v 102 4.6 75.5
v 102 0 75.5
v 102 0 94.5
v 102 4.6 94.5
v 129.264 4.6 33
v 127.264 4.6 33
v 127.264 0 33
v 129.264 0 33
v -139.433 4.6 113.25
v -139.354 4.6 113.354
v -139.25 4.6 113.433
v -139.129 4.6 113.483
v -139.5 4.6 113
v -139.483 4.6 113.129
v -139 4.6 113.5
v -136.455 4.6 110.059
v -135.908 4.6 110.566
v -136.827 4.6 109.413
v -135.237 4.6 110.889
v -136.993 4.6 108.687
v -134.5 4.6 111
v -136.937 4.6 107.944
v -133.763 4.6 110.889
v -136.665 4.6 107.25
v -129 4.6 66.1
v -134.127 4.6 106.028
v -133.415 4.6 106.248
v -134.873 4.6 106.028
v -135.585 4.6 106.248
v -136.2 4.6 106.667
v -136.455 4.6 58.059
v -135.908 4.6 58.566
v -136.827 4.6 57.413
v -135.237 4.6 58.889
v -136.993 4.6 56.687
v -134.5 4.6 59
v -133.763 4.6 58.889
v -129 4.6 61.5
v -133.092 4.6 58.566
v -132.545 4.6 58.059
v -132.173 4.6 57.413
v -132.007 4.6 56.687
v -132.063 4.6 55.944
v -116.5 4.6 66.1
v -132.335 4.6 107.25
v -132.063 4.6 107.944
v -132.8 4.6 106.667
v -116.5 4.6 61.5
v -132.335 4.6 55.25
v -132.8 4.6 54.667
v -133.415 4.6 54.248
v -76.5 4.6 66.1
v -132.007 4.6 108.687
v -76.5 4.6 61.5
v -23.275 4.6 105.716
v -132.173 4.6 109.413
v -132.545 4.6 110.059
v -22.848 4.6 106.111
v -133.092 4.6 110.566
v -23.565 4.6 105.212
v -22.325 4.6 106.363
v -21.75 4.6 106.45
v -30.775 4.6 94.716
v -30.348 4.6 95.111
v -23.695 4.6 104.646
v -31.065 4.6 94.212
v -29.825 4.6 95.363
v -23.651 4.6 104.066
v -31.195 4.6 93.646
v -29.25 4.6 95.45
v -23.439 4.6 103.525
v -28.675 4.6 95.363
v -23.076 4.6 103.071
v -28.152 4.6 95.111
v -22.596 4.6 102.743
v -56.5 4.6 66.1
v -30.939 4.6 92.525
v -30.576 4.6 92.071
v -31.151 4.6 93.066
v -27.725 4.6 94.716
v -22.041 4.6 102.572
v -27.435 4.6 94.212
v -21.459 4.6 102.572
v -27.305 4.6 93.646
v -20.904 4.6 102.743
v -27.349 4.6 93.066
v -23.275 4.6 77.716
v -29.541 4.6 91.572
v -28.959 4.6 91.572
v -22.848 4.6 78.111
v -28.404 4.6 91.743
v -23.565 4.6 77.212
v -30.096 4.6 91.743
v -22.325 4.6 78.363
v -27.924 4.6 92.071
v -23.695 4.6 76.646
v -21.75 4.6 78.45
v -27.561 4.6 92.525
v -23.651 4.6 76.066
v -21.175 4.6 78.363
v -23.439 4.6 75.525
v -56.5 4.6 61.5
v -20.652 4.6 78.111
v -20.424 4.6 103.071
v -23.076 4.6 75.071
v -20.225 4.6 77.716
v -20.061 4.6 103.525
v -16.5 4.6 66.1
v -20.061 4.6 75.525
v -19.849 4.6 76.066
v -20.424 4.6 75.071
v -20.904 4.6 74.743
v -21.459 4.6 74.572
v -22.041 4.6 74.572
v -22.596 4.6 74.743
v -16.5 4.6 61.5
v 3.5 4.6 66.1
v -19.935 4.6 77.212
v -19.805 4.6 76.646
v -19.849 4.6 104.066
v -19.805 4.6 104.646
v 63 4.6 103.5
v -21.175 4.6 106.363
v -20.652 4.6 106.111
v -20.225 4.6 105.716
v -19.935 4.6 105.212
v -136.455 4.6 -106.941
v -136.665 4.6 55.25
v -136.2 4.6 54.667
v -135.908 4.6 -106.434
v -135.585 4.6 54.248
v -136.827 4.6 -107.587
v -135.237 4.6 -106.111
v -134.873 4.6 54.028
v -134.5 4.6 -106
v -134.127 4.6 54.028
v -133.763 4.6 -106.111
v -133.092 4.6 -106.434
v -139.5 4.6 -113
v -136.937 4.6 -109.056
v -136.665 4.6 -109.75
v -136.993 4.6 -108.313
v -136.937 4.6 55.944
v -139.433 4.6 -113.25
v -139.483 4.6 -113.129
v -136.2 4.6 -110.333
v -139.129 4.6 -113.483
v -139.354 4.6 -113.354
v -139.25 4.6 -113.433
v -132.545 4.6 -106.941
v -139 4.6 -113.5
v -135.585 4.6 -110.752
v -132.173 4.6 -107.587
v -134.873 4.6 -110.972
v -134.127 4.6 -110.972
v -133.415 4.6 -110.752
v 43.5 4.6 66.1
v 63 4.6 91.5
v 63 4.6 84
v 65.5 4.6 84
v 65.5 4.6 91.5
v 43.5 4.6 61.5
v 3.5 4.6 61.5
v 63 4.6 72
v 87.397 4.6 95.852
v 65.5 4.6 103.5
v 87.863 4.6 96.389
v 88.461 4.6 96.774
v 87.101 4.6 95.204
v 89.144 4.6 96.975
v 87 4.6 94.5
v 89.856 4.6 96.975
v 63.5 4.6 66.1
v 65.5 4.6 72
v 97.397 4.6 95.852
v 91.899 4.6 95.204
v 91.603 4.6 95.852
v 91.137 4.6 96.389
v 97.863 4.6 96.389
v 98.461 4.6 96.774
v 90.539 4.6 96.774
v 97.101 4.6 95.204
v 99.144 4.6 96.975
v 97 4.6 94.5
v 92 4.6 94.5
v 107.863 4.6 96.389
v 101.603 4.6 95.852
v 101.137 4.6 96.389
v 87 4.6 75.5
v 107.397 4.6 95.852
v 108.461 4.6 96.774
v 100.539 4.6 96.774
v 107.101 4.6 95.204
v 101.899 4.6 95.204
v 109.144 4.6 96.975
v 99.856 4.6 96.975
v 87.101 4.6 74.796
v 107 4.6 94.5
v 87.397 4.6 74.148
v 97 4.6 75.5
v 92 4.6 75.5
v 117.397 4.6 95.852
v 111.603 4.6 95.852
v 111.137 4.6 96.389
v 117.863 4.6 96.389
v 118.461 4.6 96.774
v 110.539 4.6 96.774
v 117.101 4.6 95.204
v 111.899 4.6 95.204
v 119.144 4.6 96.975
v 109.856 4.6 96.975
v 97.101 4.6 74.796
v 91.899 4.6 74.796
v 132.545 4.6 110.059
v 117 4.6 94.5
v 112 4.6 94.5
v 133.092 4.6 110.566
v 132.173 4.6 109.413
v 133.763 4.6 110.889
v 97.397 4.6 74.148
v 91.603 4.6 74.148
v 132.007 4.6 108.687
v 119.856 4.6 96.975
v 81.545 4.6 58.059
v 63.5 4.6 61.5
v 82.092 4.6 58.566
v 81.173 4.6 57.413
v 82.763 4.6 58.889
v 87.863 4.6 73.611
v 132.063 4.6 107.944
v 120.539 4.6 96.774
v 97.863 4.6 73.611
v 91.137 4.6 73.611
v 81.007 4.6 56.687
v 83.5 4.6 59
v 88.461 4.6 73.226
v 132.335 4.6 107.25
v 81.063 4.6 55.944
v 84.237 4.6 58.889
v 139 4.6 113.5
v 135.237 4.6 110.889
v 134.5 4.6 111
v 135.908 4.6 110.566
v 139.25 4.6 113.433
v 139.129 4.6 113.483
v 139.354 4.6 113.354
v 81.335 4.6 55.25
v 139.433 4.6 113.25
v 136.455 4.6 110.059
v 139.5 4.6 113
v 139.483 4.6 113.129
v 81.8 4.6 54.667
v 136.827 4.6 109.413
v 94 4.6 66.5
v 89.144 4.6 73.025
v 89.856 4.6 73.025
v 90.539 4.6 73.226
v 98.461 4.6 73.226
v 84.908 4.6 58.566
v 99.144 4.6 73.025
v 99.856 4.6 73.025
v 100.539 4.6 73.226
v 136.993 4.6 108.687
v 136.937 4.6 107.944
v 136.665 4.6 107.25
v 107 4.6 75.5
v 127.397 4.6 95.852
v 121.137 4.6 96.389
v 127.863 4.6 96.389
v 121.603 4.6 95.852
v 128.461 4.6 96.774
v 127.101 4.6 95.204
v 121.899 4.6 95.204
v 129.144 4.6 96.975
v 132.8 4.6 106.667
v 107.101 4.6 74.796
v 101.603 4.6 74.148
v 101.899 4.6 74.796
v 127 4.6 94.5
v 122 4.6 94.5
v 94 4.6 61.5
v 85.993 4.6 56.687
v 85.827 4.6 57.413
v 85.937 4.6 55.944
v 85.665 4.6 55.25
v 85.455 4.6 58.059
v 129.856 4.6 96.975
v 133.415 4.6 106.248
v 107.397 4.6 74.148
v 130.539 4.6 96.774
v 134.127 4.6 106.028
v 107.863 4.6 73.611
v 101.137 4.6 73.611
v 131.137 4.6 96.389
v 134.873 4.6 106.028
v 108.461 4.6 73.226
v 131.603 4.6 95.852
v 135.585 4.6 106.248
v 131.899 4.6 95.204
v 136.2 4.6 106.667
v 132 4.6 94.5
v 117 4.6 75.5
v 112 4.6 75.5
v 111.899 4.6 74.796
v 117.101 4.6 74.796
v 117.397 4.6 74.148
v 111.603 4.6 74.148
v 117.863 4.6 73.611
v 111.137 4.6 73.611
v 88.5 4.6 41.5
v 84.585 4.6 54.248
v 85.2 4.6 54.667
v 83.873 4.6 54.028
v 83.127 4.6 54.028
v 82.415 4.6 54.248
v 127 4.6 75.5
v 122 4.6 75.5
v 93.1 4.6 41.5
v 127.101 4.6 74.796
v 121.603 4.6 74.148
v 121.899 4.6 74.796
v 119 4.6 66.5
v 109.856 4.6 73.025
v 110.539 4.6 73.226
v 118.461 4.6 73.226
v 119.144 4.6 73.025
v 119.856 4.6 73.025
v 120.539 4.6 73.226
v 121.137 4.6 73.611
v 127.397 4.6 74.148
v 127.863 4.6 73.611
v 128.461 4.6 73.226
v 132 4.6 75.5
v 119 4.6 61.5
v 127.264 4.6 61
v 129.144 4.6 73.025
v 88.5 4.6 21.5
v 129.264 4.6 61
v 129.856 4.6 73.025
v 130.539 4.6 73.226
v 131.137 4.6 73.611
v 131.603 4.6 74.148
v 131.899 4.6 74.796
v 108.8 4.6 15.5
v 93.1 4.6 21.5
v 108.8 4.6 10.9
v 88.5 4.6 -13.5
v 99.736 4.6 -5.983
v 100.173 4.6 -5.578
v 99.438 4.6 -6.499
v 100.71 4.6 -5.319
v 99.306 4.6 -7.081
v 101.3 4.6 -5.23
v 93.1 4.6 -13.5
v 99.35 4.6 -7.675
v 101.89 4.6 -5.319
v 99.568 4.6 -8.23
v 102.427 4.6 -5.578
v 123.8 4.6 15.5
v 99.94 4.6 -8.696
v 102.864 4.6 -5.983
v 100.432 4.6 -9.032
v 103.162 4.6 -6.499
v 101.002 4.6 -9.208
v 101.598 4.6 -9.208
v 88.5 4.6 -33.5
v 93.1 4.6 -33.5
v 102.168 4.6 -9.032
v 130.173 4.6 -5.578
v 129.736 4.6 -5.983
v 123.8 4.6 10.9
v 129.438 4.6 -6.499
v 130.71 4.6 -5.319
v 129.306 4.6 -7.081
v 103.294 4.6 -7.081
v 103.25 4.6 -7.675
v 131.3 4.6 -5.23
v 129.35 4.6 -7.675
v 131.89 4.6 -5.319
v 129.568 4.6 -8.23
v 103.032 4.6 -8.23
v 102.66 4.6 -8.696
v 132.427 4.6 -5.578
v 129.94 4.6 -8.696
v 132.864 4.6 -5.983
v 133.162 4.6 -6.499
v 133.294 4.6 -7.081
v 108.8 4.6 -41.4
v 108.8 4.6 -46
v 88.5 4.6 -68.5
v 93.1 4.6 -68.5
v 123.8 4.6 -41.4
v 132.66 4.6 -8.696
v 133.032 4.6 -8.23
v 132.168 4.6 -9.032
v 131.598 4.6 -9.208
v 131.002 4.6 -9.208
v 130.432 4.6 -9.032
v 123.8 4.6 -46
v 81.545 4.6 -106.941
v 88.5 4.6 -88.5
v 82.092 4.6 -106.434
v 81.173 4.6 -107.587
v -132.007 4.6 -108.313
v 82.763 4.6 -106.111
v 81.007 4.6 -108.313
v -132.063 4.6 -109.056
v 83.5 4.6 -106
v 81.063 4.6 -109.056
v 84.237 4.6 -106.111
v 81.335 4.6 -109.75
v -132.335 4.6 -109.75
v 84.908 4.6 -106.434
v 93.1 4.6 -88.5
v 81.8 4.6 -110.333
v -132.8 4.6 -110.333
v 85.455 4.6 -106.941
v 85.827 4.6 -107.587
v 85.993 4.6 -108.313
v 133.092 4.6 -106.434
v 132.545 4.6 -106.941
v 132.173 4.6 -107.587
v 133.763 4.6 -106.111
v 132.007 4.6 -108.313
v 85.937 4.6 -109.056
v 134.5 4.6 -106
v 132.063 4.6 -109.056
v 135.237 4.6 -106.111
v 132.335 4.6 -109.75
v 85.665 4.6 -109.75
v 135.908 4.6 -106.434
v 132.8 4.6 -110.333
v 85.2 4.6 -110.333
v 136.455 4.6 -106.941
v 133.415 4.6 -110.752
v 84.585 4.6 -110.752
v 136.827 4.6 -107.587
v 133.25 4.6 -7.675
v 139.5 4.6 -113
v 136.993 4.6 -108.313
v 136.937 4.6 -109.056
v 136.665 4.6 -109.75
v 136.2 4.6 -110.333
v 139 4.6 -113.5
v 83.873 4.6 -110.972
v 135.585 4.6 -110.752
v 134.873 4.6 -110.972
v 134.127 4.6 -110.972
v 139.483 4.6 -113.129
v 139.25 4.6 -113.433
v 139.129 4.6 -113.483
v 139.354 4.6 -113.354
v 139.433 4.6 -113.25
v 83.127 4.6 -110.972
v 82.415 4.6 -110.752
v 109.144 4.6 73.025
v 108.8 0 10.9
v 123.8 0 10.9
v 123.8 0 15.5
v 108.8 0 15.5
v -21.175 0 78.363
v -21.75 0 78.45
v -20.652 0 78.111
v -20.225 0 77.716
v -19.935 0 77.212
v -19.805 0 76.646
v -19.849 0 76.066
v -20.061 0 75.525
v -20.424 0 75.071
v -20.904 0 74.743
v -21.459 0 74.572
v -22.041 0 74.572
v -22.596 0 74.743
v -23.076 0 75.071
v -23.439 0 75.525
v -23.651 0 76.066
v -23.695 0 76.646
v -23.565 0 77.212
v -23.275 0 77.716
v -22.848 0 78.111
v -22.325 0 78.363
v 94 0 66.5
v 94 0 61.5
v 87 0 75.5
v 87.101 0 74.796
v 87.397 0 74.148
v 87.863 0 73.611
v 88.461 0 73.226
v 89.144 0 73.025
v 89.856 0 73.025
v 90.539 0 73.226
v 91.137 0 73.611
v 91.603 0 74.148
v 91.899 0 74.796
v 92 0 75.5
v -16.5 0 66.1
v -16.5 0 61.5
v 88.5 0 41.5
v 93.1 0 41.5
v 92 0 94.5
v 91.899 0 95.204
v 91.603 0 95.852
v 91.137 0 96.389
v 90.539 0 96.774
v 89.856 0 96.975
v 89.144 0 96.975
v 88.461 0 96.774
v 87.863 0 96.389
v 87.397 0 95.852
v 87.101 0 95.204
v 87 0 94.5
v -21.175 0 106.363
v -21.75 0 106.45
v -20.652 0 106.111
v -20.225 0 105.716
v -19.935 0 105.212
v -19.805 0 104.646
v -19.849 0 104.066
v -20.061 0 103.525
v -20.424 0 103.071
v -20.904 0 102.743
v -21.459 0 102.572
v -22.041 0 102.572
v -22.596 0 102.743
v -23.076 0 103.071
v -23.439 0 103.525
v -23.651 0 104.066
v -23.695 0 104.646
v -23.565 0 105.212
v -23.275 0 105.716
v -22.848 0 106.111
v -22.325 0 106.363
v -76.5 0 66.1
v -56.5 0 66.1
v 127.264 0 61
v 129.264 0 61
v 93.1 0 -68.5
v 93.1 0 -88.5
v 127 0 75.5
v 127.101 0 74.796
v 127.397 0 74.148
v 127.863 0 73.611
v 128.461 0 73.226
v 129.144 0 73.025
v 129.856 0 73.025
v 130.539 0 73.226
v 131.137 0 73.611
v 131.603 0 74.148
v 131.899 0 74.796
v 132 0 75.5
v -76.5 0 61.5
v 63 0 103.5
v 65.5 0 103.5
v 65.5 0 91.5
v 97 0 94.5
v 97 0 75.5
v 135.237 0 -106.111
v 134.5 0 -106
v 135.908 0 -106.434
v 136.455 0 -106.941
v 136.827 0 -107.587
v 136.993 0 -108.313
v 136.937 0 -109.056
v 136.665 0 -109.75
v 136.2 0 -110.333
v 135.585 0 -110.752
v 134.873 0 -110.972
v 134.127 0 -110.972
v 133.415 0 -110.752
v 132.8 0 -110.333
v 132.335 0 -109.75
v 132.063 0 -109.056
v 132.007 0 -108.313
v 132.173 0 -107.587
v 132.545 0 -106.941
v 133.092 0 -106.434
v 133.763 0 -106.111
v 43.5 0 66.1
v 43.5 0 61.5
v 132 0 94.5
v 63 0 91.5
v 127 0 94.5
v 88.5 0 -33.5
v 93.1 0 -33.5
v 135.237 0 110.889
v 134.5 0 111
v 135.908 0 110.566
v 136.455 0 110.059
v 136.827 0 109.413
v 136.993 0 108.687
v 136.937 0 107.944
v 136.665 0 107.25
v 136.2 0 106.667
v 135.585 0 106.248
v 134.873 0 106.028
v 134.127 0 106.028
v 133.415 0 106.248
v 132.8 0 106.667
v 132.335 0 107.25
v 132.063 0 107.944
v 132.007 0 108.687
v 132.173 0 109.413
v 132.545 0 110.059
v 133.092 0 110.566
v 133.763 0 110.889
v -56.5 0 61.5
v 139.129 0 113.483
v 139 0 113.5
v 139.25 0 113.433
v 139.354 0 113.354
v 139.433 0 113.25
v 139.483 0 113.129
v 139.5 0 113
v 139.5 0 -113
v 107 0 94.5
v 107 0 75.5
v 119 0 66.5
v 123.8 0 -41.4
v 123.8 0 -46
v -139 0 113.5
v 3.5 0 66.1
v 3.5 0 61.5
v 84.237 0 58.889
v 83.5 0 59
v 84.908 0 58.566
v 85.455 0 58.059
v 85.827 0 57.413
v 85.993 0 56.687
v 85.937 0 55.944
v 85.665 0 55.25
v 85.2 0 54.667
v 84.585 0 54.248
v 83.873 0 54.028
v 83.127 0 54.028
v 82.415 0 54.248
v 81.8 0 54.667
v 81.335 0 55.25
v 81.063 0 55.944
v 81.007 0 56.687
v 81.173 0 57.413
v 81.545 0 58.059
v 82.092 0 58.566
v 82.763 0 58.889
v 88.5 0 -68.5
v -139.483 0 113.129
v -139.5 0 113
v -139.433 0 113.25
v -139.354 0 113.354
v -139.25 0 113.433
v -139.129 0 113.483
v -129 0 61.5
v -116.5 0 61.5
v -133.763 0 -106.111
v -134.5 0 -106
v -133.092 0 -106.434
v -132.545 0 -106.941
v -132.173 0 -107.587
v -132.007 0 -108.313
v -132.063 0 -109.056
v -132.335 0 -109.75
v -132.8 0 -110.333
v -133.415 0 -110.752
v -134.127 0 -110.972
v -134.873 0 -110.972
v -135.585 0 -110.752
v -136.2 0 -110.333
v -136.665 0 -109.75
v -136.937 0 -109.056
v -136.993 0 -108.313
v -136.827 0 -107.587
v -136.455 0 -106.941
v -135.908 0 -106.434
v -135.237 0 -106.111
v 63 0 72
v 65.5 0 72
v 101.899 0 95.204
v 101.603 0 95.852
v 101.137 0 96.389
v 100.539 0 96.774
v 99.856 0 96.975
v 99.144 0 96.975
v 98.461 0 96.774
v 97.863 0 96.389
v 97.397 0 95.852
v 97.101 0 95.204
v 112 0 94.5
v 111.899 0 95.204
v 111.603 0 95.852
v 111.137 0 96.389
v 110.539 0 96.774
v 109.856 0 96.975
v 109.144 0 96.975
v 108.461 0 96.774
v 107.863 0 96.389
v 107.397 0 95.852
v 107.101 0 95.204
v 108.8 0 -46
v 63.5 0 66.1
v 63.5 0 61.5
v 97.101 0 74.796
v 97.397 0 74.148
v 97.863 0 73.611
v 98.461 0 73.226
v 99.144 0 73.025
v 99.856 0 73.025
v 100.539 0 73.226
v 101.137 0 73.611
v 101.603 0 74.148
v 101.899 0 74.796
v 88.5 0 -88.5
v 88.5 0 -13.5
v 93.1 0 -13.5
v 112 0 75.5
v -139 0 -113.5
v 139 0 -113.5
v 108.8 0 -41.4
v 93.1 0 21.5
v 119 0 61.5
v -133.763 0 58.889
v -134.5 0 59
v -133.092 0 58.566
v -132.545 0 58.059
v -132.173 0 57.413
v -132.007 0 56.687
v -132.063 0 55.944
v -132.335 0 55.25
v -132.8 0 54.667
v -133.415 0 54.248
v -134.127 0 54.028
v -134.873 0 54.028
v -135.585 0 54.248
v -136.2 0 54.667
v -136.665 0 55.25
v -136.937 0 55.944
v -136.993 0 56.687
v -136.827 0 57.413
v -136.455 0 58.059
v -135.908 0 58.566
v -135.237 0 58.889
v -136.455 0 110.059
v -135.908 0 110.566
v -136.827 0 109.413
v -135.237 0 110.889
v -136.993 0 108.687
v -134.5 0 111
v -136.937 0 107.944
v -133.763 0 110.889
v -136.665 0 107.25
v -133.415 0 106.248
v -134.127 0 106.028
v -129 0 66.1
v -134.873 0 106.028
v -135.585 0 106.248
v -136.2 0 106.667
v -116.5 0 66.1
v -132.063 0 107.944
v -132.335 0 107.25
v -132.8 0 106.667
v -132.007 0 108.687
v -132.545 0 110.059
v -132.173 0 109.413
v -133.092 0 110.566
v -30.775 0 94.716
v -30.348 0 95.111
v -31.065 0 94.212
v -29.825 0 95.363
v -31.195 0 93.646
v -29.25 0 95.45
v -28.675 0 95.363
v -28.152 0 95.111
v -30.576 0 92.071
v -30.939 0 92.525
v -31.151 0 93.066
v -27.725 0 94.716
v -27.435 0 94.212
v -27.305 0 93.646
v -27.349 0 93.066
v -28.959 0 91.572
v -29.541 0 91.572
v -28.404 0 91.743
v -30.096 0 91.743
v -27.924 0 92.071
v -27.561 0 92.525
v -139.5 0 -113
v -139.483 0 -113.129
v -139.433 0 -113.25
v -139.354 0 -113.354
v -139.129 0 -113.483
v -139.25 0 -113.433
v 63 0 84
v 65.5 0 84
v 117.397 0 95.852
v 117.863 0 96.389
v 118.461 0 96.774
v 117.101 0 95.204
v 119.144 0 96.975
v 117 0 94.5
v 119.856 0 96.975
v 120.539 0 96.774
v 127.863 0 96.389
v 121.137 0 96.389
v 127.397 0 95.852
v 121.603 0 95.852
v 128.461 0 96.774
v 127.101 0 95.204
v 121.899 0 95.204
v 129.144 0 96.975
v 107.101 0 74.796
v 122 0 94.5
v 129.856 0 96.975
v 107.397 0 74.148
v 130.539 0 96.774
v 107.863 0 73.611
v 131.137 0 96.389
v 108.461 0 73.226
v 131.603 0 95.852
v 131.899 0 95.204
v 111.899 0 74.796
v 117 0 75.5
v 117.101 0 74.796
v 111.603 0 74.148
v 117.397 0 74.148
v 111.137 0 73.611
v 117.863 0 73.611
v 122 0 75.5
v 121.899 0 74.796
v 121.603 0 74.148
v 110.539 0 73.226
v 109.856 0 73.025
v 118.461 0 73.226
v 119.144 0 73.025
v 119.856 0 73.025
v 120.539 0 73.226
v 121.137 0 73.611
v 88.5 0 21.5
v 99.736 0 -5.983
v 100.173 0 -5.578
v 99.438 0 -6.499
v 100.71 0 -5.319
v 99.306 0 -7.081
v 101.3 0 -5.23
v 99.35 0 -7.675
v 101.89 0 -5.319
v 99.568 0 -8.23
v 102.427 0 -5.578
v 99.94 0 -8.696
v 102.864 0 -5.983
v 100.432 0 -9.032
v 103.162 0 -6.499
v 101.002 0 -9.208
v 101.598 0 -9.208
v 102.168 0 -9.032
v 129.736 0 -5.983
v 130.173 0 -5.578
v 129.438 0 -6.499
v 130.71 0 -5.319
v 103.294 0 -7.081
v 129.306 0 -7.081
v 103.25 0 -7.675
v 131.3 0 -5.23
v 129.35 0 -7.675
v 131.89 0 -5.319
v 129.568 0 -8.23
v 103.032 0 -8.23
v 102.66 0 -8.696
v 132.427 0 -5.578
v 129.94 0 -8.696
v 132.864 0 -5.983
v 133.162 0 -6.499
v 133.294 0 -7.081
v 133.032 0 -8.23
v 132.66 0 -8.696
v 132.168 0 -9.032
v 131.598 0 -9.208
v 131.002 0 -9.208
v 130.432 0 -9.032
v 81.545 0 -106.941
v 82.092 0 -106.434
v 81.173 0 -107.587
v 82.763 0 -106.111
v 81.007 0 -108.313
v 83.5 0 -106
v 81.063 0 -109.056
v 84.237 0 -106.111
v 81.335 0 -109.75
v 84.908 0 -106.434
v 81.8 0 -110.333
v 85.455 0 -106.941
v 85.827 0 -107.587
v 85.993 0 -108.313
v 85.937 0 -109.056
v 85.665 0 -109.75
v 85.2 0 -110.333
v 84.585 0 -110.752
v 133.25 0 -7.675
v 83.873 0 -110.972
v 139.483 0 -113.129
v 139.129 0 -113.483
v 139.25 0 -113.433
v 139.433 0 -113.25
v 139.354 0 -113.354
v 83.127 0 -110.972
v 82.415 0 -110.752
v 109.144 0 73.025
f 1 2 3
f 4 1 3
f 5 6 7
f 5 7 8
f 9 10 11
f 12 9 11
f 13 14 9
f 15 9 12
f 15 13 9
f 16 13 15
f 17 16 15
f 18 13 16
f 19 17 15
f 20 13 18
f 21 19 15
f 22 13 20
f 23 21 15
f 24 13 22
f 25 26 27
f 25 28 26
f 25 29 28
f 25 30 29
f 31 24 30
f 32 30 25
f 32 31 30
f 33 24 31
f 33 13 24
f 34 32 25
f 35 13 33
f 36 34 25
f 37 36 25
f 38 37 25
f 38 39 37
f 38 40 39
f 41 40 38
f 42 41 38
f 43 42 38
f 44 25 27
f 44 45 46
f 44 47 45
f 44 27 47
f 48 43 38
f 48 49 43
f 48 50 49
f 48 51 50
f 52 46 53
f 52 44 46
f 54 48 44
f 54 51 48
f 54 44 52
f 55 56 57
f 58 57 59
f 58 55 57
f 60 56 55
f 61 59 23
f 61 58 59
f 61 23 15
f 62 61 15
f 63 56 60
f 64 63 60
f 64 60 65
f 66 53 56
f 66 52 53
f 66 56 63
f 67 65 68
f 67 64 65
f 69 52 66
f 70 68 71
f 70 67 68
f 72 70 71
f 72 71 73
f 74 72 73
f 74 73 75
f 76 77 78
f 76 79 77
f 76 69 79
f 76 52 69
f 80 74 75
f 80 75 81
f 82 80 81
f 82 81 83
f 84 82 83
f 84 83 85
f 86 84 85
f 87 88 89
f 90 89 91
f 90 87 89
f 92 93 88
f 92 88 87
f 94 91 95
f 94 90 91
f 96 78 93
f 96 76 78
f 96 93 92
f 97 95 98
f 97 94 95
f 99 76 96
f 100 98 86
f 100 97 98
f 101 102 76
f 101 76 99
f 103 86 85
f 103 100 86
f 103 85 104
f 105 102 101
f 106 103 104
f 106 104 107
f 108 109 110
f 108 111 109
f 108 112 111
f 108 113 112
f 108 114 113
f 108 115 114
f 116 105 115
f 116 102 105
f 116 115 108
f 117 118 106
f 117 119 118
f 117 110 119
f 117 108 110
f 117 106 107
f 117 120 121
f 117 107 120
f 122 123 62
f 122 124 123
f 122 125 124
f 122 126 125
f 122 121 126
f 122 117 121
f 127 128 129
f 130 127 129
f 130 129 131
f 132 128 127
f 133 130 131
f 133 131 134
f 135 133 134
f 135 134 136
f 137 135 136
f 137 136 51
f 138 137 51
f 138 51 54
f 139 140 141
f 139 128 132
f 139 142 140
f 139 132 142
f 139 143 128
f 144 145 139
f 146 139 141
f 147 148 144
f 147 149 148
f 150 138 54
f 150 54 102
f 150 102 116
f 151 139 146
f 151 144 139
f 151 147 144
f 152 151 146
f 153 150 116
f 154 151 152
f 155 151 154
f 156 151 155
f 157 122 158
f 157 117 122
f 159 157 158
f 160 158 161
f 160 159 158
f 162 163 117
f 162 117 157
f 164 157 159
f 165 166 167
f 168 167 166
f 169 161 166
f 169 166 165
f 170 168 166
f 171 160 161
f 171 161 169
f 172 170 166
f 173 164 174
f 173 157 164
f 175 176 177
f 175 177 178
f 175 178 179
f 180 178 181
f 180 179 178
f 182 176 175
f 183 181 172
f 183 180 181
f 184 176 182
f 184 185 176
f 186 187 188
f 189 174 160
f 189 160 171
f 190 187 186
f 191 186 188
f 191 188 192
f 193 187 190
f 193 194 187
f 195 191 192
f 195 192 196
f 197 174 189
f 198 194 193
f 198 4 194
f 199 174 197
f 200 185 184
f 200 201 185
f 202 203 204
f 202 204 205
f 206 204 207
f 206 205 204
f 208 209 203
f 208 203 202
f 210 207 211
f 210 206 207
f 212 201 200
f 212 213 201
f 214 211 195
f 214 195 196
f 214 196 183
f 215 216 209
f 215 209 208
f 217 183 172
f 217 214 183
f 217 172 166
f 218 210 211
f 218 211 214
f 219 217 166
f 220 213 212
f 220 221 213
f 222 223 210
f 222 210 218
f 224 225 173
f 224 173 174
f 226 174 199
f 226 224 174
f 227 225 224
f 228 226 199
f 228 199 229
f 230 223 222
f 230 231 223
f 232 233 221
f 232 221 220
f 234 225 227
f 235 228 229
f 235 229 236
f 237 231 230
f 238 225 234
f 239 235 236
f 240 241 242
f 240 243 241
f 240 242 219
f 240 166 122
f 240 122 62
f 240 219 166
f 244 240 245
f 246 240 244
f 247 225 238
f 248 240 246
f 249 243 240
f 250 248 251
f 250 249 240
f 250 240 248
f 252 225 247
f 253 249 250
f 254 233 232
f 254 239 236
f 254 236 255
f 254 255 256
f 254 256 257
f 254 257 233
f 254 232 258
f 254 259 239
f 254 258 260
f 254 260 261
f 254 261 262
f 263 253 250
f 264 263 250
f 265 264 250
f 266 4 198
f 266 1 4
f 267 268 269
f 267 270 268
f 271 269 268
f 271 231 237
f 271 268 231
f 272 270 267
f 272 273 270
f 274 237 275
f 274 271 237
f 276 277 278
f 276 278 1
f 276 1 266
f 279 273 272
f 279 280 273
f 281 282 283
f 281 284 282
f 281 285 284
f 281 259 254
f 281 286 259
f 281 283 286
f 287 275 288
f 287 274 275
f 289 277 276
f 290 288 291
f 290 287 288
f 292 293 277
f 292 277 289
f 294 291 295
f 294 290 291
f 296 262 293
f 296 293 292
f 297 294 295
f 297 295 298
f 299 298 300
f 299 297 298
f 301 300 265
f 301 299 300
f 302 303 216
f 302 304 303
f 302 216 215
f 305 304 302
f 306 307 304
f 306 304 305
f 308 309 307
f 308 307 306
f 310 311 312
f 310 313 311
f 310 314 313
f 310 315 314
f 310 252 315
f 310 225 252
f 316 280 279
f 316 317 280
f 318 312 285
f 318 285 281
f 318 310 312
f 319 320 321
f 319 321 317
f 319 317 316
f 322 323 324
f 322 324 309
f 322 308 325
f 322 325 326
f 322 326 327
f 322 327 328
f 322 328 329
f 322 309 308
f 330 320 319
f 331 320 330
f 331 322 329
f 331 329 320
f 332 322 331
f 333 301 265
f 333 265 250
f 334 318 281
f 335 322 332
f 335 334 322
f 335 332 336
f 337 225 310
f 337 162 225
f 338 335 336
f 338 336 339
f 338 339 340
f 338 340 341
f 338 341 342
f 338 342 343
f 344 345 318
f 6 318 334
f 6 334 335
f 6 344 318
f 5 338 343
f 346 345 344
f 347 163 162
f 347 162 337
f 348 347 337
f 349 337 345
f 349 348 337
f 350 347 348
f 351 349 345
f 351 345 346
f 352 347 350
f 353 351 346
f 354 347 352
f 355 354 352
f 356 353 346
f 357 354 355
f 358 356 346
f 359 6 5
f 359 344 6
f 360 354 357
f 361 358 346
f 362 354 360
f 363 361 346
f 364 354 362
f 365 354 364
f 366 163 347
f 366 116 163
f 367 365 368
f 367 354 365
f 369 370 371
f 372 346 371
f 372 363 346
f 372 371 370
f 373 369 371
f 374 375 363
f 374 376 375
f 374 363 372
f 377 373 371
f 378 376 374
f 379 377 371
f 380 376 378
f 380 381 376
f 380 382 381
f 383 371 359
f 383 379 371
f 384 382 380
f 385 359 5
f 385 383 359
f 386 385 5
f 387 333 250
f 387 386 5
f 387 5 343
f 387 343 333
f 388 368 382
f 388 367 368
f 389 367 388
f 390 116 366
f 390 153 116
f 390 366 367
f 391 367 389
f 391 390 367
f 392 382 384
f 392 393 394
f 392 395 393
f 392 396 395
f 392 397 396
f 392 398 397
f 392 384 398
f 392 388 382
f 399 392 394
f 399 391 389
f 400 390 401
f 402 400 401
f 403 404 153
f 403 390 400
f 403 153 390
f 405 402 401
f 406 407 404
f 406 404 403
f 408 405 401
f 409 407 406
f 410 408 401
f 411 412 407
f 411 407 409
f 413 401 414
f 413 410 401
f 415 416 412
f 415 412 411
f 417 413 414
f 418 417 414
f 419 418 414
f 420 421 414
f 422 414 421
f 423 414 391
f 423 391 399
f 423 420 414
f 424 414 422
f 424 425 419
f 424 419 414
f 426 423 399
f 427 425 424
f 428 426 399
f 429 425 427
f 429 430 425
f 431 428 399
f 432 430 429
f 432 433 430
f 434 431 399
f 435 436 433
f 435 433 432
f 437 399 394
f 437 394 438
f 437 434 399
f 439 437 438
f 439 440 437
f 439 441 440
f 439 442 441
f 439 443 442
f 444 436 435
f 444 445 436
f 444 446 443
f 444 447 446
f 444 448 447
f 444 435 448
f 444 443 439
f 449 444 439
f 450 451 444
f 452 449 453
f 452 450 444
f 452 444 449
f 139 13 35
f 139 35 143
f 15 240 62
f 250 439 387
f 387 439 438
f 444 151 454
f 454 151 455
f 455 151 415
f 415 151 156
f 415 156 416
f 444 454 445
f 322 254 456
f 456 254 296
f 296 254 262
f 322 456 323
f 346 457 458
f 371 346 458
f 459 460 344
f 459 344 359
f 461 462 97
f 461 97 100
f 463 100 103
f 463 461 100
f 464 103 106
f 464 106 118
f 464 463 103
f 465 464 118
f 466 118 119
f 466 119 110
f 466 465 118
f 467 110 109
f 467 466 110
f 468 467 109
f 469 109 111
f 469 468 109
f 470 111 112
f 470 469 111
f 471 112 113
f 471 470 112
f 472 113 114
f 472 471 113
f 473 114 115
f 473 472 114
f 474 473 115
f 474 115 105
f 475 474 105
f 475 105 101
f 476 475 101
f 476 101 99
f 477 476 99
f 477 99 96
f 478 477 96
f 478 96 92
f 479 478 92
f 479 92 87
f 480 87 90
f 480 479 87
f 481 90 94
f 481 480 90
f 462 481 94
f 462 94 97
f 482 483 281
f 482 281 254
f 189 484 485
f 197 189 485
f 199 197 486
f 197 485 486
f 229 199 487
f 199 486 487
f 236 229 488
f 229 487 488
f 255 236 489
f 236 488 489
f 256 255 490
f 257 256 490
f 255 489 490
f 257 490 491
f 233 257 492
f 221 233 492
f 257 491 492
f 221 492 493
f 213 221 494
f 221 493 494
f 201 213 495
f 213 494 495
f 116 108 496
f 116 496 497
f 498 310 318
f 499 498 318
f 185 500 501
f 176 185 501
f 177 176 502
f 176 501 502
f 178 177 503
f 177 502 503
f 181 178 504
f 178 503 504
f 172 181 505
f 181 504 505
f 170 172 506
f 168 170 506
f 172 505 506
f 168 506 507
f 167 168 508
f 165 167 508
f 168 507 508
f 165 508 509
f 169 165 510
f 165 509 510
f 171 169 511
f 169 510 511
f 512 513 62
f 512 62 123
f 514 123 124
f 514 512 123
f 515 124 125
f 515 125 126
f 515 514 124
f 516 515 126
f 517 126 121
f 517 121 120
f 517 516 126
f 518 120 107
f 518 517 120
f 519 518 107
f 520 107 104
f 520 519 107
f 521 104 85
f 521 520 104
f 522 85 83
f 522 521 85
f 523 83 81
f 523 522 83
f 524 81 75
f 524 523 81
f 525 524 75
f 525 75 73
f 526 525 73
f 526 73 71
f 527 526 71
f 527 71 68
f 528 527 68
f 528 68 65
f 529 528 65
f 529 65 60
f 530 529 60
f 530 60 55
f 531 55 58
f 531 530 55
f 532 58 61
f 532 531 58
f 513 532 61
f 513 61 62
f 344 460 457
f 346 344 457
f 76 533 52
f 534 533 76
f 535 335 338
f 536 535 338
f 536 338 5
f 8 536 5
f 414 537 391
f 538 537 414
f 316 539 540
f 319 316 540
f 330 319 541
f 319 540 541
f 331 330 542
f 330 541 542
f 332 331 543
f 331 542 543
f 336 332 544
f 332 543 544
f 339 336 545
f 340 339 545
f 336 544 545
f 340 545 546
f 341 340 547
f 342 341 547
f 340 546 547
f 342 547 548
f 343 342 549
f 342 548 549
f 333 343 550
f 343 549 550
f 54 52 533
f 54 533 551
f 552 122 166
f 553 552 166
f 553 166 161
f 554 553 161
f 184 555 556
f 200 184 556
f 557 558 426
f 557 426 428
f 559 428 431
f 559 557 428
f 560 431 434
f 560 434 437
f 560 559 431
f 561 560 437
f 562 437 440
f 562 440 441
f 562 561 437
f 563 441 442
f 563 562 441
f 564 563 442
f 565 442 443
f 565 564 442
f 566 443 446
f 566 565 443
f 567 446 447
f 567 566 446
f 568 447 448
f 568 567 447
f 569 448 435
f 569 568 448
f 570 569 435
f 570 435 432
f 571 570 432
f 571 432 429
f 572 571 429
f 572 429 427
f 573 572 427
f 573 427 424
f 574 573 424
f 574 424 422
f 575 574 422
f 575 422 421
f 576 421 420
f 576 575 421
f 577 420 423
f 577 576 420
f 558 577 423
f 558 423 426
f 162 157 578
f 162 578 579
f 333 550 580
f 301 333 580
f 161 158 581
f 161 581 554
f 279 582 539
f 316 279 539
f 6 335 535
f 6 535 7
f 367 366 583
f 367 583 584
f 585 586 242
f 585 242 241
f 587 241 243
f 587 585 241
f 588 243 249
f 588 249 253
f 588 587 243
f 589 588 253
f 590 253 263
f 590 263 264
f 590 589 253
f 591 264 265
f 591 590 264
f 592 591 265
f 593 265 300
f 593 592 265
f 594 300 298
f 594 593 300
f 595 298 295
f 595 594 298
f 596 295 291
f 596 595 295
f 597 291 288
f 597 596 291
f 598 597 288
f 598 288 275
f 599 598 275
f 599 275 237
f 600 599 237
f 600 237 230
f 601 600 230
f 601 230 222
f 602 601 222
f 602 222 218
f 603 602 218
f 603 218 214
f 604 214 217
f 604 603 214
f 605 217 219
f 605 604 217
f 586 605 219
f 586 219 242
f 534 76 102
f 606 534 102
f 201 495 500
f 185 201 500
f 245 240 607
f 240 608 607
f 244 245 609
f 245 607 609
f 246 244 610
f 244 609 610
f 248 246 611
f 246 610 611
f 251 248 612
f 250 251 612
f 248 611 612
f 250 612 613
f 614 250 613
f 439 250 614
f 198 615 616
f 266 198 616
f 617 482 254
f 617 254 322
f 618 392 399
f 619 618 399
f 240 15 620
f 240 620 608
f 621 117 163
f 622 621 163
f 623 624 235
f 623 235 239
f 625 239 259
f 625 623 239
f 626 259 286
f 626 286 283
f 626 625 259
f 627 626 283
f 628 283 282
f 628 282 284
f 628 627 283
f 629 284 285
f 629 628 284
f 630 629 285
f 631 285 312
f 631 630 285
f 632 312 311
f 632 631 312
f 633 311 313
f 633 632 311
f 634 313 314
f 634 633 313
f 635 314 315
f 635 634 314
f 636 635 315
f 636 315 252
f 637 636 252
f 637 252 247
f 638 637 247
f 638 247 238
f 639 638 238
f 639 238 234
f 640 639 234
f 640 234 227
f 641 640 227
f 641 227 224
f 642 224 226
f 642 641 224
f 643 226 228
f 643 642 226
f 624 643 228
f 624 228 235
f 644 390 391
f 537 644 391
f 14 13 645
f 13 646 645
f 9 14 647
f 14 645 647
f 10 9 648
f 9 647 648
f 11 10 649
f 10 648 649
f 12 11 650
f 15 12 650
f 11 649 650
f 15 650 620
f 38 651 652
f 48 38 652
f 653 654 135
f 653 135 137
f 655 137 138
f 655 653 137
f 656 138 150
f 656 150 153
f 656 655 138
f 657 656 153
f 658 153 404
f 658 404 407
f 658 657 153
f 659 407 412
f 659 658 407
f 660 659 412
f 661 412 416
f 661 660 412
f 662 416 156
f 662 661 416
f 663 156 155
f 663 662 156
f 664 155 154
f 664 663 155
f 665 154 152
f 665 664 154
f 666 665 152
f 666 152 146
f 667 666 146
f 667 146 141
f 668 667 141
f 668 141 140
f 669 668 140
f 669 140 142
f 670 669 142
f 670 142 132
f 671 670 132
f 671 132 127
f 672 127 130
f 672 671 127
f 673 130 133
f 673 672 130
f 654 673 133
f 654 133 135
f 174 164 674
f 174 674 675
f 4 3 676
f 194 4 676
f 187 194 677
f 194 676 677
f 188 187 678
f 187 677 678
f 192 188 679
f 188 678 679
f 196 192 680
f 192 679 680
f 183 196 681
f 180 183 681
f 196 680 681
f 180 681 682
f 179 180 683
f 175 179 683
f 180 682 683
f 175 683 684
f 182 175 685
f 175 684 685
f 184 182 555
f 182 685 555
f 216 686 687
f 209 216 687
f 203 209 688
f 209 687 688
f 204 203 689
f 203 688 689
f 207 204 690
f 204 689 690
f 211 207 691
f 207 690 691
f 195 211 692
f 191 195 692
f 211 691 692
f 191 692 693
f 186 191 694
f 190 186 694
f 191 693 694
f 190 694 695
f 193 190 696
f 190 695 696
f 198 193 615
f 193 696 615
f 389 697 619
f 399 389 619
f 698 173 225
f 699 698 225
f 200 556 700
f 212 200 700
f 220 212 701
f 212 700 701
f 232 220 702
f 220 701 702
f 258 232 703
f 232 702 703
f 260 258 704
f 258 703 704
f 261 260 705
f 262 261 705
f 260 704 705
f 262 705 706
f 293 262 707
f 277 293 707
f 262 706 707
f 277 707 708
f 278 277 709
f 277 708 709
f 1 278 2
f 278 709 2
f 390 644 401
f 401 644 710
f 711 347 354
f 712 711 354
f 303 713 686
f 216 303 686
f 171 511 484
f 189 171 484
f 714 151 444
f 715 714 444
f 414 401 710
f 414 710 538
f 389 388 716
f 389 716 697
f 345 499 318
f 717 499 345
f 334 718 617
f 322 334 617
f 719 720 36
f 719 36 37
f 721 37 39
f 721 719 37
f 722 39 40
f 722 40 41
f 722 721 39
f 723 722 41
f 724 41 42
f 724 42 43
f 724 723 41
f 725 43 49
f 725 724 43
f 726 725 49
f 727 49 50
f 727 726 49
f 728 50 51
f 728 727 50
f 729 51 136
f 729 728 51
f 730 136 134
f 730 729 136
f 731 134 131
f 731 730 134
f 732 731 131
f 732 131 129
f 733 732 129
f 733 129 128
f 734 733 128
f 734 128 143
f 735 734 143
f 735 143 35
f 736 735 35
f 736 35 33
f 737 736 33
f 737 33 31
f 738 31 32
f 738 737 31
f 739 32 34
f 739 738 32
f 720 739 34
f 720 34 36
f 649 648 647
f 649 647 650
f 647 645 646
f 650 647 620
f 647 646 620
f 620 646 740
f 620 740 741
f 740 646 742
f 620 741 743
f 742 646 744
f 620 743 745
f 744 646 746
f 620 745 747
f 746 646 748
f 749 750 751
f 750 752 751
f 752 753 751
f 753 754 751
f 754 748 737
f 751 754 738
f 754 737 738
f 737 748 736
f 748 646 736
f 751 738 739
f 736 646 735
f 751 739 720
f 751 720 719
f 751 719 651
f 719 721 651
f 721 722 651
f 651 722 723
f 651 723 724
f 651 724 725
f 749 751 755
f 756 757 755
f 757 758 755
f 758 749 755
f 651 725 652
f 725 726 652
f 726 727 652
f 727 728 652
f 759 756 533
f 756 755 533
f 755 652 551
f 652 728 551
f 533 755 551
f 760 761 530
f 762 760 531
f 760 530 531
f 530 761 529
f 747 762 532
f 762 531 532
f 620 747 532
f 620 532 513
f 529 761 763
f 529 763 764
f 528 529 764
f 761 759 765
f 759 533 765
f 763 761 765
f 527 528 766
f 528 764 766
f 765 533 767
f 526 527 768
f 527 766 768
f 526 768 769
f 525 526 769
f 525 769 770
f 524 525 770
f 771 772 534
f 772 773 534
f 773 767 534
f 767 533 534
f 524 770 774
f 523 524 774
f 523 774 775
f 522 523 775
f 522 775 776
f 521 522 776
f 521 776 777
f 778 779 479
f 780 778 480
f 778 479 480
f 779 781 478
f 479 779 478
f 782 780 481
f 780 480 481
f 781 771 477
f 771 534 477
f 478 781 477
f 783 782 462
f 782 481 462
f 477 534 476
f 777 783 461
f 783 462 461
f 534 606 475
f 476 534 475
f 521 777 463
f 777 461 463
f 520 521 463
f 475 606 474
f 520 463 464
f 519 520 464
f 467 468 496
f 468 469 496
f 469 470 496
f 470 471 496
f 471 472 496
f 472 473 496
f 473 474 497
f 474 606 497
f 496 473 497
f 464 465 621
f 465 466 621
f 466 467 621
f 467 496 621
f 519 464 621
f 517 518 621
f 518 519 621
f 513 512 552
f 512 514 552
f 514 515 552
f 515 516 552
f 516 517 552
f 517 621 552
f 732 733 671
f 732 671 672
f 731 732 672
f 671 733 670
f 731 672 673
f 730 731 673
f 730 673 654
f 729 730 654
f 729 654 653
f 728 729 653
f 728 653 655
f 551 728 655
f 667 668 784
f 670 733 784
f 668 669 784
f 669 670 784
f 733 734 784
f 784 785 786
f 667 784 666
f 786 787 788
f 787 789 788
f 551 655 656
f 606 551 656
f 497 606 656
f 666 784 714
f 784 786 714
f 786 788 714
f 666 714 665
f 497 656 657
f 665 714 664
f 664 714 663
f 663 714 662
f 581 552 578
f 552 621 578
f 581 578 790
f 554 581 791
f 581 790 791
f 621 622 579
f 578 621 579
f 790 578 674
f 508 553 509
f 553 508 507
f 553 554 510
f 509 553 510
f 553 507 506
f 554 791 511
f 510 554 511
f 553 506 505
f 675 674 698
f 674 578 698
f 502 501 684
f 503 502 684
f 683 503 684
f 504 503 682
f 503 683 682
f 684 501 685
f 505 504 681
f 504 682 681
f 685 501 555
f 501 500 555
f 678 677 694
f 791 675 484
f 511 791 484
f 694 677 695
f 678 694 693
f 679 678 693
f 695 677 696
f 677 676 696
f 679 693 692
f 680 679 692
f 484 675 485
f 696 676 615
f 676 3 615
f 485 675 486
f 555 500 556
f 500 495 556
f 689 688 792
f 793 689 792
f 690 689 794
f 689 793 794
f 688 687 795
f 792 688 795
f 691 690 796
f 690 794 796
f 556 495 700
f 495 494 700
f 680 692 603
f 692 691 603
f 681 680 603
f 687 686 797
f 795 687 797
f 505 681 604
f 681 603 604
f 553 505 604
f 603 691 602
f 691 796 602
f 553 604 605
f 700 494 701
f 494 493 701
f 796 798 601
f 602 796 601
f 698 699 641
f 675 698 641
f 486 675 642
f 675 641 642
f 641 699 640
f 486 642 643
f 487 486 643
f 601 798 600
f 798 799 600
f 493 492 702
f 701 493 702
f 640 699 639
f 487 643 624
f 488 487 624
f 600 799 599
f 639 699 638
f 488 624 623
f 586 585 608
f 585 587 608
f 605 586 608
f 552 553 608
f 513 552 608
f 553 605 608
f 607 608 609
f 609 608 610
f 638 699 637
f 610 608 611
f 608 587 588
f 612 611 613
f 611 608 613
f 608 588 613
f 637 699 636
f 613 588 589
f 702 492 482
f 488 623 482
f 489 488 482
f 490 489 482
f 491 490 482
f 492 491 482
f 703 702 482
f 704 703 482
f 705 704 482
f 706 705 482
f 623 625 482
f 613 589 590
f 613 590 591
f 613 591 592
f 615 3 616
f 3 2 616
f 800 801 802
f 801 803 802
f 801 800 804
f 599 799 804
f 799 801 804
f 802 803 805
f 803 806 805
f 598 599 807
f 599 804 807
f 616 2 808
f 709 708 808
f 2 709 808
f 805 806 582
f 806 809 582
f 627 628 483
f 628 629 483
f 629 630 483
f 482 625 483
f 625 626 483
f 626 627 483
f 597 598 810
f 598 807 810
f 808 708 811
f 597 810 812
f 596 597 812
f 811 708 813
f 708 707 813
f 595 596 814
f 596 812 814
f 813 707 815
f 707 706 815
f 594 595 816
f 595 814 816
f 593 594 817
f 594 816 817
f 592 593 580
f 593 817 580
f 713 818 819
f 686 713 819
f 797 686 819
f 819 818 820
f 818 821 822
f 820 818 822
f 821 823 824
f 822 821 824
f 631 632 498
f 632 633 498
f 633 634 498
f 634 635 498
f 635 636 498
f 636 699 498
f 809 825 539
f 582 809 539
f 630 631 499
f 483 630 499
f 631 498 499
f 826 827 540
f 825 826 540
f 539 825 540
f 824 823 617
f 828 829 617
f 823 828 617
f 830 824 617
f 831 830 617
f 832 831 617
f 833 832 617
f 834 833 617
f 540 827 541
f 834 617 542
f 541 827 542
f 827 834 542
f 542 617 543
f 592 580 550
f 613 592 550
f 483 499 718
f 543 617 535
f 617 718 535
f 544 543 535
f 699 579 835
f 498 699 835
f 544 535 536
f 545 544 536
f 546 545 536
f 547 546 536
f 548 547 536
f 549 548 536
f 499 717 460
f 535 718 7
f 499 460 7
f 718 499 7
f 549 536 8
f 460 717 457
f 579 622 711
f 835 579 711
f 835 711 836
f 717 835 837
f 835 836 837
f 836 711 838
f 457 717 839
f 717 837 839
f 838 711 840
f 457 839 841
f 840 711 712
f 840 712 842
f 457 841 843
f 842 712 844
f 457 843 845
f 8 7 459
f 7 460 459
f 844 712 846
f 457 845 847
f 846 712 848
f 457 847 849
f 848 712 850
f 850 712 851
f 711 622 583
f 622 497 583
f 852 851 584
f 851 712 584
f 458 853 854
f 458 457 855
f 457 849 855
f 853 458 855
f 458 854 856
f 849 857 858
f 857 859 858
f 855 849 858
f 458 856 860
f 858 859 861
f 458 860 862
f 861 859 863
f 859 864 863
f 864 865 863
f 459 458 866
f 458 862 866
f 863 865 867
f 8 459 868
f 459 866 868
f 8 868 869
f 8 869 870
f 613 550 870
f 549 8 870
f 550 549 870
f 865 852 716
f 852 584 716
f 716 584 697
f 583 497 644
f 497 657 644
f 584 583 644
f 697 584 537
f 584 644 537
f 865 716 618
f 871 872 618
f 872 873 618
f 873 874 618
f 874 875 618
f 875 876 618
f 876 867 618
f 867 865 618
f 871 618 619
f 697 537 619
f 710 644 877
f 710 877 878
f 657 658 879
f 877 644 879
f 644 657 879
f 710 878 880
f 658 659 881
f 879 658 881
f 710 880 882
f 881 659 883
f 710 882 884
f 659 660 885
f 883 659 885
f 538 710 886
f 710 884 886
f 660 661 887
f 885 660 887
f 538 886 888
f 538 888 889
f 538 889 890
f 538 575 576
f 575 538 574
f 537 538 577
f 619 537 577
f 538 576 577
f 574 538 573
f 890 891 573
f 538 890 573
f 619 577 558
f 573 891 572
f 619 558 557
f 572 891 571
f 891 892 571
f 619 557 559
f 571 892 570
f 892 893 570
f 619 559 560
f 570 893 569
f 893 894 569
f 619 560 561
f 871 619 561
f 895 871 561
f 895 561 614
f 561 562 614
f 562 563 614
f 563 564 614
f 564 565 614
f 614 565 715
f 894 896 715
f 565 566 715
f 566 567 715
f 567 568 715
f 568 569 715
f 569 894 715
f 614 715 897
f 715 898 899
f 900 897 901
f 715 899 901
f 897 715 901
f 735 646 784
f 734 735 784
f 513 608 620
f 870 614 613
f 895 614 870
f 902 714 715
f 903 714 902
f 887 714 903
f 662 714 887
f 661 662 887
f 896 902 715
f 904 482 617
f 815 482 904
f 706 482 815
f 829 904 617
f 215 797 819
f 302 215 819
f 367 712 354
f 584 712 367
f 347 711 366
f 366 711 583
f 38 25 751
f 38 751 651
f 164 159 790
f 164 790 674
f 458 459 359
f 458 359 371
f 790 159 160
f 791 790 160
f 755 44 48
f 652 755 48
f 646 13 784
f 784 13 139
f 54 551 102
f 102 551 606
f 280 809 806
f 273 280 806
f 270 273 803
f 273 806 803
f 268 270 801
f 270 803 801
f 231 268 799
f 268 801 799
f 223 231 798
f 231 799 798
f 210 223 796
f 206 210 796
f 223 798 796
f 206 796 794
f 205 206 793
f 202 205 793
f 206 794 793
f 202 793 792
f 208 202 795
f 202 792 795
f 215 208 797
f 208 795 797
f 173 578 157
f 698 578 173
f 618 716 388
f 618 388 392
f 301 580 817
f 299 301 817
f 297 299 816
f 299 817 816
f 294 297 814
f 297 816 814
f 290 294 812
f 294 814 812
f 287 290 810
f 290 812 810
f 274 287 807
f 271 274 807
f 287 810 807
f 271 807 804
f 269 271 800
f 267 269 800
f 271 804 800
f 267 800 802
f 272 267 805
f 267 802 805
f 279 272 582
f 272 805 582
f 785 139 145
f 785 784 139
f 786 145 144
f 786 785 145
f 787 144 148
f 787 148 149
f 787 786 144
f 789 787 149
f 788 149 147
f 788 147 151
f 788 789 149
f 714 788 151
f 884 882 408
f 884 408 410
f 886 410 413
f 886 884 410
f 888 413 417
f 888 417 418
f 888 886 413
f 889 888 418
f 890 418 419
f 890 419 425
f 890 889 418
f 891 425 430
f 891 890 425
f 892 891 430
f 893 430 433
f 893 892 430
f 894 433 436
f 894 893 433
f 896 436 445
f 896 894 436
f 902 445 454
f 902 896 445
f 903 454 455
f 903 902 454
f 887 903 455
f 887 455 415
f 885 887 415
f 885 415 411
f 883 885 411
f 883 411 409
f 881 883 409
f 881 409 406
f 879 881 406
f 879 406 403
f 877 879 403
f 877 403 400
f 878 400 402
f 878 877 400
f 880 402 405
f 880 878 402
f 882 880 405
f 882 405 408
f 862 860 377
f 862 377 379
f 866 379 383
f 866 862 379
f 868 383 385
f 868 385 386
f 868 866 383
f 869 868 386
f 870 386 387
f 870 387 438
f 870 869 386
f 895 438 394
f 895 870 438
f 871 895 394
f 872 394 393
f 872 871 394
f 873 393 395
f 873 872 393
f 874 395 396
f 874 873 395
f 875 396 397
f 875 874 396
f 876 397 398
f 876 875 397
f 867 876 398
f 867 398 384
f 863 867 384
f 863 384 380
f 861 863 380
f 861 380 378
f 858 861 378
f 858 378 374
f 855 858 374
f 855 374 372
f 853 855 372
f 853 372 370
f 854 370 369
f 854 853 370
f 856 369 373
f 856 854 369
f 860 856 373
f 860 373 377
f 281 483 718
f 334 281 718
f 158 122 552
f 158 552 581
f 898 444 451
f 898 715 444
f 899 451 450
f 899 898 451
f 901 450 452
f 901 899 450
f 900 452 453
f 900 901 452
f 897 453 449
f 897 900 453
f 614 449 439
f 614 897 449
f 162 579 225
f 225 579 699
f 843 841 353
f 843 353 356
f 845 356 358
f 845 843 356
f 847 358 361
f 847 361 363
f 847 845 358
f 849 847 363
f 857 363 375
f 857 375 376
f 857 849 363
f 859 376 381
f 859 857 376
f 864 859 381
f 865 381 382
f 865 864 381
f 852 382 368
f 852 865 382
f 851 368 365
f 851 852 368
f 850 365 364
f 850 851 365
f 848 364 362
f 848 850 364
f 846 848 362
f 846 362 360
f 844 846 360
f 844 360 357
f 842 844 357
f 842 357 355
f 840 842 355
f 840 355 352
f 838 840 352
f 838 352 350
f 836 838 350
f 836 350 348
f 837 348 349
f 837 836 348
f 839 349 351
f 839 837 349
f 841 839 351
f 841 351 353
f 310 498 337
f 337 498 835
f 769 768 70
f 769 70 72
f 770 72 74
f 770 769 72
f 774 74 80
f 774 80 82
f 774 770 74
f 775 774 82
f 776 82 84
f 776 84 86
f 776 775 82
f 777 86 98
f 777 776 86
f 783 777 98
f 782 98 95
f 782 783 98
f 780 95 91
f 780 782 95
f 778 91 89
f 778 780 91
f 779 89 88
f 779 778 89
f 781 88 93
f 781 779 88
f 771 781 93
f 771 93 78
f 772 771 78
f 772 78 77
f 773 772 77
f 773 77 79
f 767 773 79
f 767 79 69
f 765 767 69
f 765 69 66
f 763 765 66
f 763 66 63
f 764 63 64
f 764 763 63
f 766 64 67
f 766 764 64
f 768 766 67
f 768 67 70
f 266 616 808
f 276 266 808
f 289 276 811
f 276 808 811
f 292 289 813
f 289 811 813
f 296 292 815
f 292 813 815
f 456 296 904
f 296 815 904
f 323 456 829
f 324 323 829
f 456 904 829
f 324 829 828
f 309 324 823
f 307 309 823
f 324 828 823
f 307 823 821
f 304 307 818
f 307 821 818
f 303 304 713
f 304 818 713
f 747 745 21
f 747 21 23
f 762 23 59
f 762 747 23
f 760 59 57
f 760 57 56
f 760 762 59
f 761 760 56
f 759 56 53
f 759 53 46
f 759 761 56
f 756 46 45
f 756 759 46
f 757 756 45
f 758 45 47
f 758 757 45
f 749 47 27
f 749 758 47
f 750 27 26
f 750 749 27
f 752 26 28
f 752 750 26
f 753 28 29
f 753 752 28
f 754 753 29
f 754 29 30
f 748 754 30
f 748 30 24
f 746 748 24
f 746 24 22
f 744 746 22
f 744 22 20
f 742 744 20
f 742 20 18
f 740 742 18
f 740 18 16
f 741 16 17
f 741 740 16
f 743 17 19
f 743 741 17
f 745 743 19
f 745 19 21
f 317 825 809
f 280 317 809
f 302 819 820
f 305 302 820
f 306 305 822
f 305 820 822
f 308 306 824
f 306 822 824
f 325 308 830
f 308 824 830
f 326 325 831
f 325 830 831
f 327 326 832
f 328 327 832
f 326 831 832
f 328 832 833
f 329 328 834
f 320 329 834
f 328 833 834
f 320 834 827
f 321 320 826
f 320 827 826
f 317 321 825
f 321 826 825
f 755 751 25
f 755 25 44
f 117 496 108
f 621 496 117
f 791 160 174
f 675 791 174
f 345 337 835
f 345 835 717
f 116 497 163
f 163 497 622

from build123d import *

# Parameters (mm, degrees)
SKETCH1_W           = 281
SKETCH1_H           = 229
SKETCH1_R           = 2.5
SKETCH1_R_2         = 2
SKETCH1_R_3         = 1.95
SKETCH1_W_2         = 12.5
SKETCH1_H_2         = 4.6
SKETCH1_W_3         = 15
SKETCH1_W_4         = 4.6
SKETCH1_H_3         = 20
SKETCH1_W_5         = 20
BOSS_EXTRUDE1_DEPTH = 4.6
SKETCH2_W           = 281
SKETCH2_H           = 229
SKETCH2_W_2         = 279
SKETCH2_H_2         = 227
CUT_EXTRUDE1_DEPTH  = 182.305432903
SKETCH3_W           = 25
SKETCH3_H           = 5
CUT_EXTRUDE2_DEPTH  = 180.899027235
SKETCH6_W           = 2.5
SKETCH6_H           = 12
CUT_EXTRUDE5_DEPTH  = 180.899027235
CUT_EXTRUDE4_DEPTH  = 180.899027235
SKETCH8_W           = 2
SKETCH8_H           = 27.99999988
CUT_EXTRUDE7_DEPTH  = 180.899027235
FILLET2_R           = 0.5


with BuildPart() as part:
    # Sketch1 → Boss-Extrude1 (new body)
    with BuildSketch(Plane(origin=(0, 0, 0), x_dir=(1, 0, 0), z_dir=(0, 1, 0))):
        Rectangle(SKETCH1_W, SKETCH1_H)
        with Locations(Location((-134.5, 108.5, 0), (0, 0, 270))):
            Circle(SKETCH1_R, mode=Mode.SUBTRACT)
        with Locations(Location((134.5, 108.5, 0), (0, 0, 270))):
            Circle(SKETCH1_R, mode=Mode.SUBTRACT)
        with Locations(Location((83.5, 108.5, 0), (0, 0, 270))):
            Circle(SKETCH1_R, mode=Mode.SUBTRACT)
        with Locations(Location((134.5, -108.5, 0), (0, 0, 270))):
            Circle(SKETCH1_R, mode=Mode.SUBTRACT)
        with Locations(Location((83.5, -56.5, 0), (0, 0, 270))):
            Circle(SKETCH1_R, mode=Mode.SUBTRACT)
        with Locations(Location((-134.5, -56.5, 0), (0, 0, 270))):
            Circle(SKETCH1_R, mode=Mode.SUBTRACT)
        with Locations(Location((101.3, 7.23, 0), (0, 0, 270))):
            Circle(SKETCH1_R_2, mode=Mode.SUBTRACT)
        with Locations(Location((-134.5, -108.5, 0), (0, 0, 270))):
            Circle(SKETCH1_R, mode=Mode.SUBTRACT)
        with Locations(Location((131.3, 7.23, 0), (0, 0, 270))):
            Circle(SKETCH1_R_2, mode=Mode.SUBTRACT)
        with Locations(Location((-21.75, -104.5, 0), (0, 0, 270))):
            Circle(SKETCH1_R_3, mode=Mode.SUBTRACT)
        with Locations(Location((-29.25, -93.5, 0), (0, 0, 270))):
            Circle(SKETCH1_R_3, mode=Mode.SUBTRACT)
        with Locations(Location((-21.75, -76.5, 0), (0, 0, 270))):
            Circle(SKETCH1_R_3, mode=Mode.SUBTRACT)
        with Locations((-122.75, -63.8)):
            Rectangle(SKETCH1_W_2, SKETCH1_H_2, mode=Mode.SUBTRACT)
        with Locations((116.3, 43.7)):
            Rectangle(SKETCH1_W_3, SKETCH1_H_2, mode=Mode.SUBTRACT)
        with Locations((116.3, -13.2)):
            Rectangle(SKETCH1_W_3, SKETCH1_H_2, mode=Mode.SUBTRACT)
        with Locations((90.8, -31.5)):
            Rectangle(SKETCH1_W_4, SKETCH1_H_3, mode=Mode.SUBTRACT)
        with Locations((90.8, 78.5)):
            Rectangle(SKETCH1_W_4, SKETCH1_H_3, mode=Mode.SUBTRACT)
        with Locations((-66.5, -63.8)):
            Rectangle(SKETCH1_W_5, SKETCH1_H_2, mode=Mode.SUBTRACT)
        with Locations((53.5, -63.8)):
            Rectangle(SKETCH1_W_5, SKETCH1_H_2, mode=Mode.SUBTRACT)
        with Locations((90.8, 23.5)):
            Rectangle(SKETCH1_W_4, SKETCH1_H_3, mode=Mode.SUBTRACT)
        with Locations((-6.5, -63.8)):
            Rectangle(SKETCH1_W_5, SKETCH1_H_2, mode=Mode.SUBTRACT)
    extrude(amount=BOSS_EXTRUDE1_DEPTH)

    # Sketch2 → Cut-Extrude1 (cut, through all)
    with BuildSketch(Plane(origin=(0, 4.6, 0), x_dir=(1, 0, 0), z_dir=(0, 1, 0))):
        Rectangle(SKETCH2_W, SKETCH2_H)
        Rectangle(SKETCH2_W_2, SKETCH2_H_2, mode=Mode.SUBTRACT)
    extrude(amount=-CUT_EXTRUDE1_DEPTH, mode=Mode.SUBTRACT)

    # Sketch3 → Cut-Extrude2 (cut, through all)
    with BuildSketch(Plane.XZ):
        with Locations((106.5, 64)):
            Rectangle(SKETCH3_W, SKETCH3_H)
    extrude(amount=-CUT_EXTRUDE2_DEPTH, mode=Mode.SUBTRACT)

    # Sketch6 → Cut-Extrude5 (cut, through all)
    with BuildSketch(Plane(origin=(0, 4.6, 0), x_dir=(1, 0, 0), z_dir=(0, 1, 0))):
        with Locations((64.25, -78)):
            Rectangle(SKETCH6_W, SKETCH6_H)
        with Locations((64.25, -97.5)):
            Rectangle(SKETCH6_W, SKETCH6_H)
    extrude(amount=-CUT_EXTRUDE5_DEPTH, mode=Mode.SUBTRACT)

    # Sketch5 → Cut-Extrude4 (cut, through all)
    with BuildSketch(Plane(origin=(0, 0, 0), x_dir=(1, 0, 0), z_dir=(0, 1, 0))):
        with BuildLine():
            Line((132, -75.5), (132, -94.5))
            ThreePointArc((132, -94.5), (129.5, -97), (127, -94.5))
            Line((127, -94.5), (127, -75.5))
            ThreePointArc((127, -75.5), (129.5, -73), (132, -75.5))
        make_face()
        with BuildLine():
            Line((122, -75.5), (122, -94.5))
            ThreePointArc((122, -94.5), (119.5, -97), (117, -94.5))
            Line((117, -94.5), (117, -75.5))
            ThreePointArc((117, -75.5), (119.5, -73), (122, -75.5))
        make_face()
        with BuildLine():
            Line((112, -75.5), (112, -94.5))
            ThreePointArc((112, -94.5), (109.5, -97), (107, -94.5))
            Line((107, -94.5), (107, -75.5))
            ThreePointArc((107, -75.5), (109.5, -73), (112, -75.5))
        make_face()
        with BuildLine():
            Line((102, -75.5), (102, -94.5))
            ThreePointArc((102, -94.5), (99.5, -97), (97, -94.5))
            Line((97, -94.5), (97, -75.5))
            ThreePointArc((97, -75.5), (99.5, -73), (102, -75.5))
        make_face()
        with BuildLine():
            Line((92, -75.5), (92, -94.5))
            ThreePointArc((92, -94.5), (89.5, -97), (87, -94.5))
            Line((87, -94.5), (87, -75.5))
            ThreePointArc((87, -75.5), (89.5, -73), (92, -75.5))
        make_face()
    extrude(amount=CUT_EXTRUDE4_DEPTH, mode=Mode.SUBTRACT)

    # Sketch8 → Cut-Extrude7 (cut, through all)
    with BuildSketch(Plane(origin=(0, 4.6, 0), x_dir=(1, 0, 0), z_dir=(0, 1, 0))):
        with Locations((128.26444081, -47.0000889)):
            Rectangle(SKETCH8_W, SKETCH8_H)
    extrude(amount=-CUT_EXTRUDE7_DEPTH, mode=Mode.SUBTRACT)

    # Fillet2
    fillet2_edges = [part.edges().sort_by_distance(p)[0] for p in [
        (-139.5, 2.3, -113.5),
        (139.5, 2.3, -113.5),
        (139.5, 2.3, 113.5),
        (-139.5, 2.3, 113.5),
    ]]
    fillet(fillet2_edges, radius=FILLET2_R)


solid = part.part
